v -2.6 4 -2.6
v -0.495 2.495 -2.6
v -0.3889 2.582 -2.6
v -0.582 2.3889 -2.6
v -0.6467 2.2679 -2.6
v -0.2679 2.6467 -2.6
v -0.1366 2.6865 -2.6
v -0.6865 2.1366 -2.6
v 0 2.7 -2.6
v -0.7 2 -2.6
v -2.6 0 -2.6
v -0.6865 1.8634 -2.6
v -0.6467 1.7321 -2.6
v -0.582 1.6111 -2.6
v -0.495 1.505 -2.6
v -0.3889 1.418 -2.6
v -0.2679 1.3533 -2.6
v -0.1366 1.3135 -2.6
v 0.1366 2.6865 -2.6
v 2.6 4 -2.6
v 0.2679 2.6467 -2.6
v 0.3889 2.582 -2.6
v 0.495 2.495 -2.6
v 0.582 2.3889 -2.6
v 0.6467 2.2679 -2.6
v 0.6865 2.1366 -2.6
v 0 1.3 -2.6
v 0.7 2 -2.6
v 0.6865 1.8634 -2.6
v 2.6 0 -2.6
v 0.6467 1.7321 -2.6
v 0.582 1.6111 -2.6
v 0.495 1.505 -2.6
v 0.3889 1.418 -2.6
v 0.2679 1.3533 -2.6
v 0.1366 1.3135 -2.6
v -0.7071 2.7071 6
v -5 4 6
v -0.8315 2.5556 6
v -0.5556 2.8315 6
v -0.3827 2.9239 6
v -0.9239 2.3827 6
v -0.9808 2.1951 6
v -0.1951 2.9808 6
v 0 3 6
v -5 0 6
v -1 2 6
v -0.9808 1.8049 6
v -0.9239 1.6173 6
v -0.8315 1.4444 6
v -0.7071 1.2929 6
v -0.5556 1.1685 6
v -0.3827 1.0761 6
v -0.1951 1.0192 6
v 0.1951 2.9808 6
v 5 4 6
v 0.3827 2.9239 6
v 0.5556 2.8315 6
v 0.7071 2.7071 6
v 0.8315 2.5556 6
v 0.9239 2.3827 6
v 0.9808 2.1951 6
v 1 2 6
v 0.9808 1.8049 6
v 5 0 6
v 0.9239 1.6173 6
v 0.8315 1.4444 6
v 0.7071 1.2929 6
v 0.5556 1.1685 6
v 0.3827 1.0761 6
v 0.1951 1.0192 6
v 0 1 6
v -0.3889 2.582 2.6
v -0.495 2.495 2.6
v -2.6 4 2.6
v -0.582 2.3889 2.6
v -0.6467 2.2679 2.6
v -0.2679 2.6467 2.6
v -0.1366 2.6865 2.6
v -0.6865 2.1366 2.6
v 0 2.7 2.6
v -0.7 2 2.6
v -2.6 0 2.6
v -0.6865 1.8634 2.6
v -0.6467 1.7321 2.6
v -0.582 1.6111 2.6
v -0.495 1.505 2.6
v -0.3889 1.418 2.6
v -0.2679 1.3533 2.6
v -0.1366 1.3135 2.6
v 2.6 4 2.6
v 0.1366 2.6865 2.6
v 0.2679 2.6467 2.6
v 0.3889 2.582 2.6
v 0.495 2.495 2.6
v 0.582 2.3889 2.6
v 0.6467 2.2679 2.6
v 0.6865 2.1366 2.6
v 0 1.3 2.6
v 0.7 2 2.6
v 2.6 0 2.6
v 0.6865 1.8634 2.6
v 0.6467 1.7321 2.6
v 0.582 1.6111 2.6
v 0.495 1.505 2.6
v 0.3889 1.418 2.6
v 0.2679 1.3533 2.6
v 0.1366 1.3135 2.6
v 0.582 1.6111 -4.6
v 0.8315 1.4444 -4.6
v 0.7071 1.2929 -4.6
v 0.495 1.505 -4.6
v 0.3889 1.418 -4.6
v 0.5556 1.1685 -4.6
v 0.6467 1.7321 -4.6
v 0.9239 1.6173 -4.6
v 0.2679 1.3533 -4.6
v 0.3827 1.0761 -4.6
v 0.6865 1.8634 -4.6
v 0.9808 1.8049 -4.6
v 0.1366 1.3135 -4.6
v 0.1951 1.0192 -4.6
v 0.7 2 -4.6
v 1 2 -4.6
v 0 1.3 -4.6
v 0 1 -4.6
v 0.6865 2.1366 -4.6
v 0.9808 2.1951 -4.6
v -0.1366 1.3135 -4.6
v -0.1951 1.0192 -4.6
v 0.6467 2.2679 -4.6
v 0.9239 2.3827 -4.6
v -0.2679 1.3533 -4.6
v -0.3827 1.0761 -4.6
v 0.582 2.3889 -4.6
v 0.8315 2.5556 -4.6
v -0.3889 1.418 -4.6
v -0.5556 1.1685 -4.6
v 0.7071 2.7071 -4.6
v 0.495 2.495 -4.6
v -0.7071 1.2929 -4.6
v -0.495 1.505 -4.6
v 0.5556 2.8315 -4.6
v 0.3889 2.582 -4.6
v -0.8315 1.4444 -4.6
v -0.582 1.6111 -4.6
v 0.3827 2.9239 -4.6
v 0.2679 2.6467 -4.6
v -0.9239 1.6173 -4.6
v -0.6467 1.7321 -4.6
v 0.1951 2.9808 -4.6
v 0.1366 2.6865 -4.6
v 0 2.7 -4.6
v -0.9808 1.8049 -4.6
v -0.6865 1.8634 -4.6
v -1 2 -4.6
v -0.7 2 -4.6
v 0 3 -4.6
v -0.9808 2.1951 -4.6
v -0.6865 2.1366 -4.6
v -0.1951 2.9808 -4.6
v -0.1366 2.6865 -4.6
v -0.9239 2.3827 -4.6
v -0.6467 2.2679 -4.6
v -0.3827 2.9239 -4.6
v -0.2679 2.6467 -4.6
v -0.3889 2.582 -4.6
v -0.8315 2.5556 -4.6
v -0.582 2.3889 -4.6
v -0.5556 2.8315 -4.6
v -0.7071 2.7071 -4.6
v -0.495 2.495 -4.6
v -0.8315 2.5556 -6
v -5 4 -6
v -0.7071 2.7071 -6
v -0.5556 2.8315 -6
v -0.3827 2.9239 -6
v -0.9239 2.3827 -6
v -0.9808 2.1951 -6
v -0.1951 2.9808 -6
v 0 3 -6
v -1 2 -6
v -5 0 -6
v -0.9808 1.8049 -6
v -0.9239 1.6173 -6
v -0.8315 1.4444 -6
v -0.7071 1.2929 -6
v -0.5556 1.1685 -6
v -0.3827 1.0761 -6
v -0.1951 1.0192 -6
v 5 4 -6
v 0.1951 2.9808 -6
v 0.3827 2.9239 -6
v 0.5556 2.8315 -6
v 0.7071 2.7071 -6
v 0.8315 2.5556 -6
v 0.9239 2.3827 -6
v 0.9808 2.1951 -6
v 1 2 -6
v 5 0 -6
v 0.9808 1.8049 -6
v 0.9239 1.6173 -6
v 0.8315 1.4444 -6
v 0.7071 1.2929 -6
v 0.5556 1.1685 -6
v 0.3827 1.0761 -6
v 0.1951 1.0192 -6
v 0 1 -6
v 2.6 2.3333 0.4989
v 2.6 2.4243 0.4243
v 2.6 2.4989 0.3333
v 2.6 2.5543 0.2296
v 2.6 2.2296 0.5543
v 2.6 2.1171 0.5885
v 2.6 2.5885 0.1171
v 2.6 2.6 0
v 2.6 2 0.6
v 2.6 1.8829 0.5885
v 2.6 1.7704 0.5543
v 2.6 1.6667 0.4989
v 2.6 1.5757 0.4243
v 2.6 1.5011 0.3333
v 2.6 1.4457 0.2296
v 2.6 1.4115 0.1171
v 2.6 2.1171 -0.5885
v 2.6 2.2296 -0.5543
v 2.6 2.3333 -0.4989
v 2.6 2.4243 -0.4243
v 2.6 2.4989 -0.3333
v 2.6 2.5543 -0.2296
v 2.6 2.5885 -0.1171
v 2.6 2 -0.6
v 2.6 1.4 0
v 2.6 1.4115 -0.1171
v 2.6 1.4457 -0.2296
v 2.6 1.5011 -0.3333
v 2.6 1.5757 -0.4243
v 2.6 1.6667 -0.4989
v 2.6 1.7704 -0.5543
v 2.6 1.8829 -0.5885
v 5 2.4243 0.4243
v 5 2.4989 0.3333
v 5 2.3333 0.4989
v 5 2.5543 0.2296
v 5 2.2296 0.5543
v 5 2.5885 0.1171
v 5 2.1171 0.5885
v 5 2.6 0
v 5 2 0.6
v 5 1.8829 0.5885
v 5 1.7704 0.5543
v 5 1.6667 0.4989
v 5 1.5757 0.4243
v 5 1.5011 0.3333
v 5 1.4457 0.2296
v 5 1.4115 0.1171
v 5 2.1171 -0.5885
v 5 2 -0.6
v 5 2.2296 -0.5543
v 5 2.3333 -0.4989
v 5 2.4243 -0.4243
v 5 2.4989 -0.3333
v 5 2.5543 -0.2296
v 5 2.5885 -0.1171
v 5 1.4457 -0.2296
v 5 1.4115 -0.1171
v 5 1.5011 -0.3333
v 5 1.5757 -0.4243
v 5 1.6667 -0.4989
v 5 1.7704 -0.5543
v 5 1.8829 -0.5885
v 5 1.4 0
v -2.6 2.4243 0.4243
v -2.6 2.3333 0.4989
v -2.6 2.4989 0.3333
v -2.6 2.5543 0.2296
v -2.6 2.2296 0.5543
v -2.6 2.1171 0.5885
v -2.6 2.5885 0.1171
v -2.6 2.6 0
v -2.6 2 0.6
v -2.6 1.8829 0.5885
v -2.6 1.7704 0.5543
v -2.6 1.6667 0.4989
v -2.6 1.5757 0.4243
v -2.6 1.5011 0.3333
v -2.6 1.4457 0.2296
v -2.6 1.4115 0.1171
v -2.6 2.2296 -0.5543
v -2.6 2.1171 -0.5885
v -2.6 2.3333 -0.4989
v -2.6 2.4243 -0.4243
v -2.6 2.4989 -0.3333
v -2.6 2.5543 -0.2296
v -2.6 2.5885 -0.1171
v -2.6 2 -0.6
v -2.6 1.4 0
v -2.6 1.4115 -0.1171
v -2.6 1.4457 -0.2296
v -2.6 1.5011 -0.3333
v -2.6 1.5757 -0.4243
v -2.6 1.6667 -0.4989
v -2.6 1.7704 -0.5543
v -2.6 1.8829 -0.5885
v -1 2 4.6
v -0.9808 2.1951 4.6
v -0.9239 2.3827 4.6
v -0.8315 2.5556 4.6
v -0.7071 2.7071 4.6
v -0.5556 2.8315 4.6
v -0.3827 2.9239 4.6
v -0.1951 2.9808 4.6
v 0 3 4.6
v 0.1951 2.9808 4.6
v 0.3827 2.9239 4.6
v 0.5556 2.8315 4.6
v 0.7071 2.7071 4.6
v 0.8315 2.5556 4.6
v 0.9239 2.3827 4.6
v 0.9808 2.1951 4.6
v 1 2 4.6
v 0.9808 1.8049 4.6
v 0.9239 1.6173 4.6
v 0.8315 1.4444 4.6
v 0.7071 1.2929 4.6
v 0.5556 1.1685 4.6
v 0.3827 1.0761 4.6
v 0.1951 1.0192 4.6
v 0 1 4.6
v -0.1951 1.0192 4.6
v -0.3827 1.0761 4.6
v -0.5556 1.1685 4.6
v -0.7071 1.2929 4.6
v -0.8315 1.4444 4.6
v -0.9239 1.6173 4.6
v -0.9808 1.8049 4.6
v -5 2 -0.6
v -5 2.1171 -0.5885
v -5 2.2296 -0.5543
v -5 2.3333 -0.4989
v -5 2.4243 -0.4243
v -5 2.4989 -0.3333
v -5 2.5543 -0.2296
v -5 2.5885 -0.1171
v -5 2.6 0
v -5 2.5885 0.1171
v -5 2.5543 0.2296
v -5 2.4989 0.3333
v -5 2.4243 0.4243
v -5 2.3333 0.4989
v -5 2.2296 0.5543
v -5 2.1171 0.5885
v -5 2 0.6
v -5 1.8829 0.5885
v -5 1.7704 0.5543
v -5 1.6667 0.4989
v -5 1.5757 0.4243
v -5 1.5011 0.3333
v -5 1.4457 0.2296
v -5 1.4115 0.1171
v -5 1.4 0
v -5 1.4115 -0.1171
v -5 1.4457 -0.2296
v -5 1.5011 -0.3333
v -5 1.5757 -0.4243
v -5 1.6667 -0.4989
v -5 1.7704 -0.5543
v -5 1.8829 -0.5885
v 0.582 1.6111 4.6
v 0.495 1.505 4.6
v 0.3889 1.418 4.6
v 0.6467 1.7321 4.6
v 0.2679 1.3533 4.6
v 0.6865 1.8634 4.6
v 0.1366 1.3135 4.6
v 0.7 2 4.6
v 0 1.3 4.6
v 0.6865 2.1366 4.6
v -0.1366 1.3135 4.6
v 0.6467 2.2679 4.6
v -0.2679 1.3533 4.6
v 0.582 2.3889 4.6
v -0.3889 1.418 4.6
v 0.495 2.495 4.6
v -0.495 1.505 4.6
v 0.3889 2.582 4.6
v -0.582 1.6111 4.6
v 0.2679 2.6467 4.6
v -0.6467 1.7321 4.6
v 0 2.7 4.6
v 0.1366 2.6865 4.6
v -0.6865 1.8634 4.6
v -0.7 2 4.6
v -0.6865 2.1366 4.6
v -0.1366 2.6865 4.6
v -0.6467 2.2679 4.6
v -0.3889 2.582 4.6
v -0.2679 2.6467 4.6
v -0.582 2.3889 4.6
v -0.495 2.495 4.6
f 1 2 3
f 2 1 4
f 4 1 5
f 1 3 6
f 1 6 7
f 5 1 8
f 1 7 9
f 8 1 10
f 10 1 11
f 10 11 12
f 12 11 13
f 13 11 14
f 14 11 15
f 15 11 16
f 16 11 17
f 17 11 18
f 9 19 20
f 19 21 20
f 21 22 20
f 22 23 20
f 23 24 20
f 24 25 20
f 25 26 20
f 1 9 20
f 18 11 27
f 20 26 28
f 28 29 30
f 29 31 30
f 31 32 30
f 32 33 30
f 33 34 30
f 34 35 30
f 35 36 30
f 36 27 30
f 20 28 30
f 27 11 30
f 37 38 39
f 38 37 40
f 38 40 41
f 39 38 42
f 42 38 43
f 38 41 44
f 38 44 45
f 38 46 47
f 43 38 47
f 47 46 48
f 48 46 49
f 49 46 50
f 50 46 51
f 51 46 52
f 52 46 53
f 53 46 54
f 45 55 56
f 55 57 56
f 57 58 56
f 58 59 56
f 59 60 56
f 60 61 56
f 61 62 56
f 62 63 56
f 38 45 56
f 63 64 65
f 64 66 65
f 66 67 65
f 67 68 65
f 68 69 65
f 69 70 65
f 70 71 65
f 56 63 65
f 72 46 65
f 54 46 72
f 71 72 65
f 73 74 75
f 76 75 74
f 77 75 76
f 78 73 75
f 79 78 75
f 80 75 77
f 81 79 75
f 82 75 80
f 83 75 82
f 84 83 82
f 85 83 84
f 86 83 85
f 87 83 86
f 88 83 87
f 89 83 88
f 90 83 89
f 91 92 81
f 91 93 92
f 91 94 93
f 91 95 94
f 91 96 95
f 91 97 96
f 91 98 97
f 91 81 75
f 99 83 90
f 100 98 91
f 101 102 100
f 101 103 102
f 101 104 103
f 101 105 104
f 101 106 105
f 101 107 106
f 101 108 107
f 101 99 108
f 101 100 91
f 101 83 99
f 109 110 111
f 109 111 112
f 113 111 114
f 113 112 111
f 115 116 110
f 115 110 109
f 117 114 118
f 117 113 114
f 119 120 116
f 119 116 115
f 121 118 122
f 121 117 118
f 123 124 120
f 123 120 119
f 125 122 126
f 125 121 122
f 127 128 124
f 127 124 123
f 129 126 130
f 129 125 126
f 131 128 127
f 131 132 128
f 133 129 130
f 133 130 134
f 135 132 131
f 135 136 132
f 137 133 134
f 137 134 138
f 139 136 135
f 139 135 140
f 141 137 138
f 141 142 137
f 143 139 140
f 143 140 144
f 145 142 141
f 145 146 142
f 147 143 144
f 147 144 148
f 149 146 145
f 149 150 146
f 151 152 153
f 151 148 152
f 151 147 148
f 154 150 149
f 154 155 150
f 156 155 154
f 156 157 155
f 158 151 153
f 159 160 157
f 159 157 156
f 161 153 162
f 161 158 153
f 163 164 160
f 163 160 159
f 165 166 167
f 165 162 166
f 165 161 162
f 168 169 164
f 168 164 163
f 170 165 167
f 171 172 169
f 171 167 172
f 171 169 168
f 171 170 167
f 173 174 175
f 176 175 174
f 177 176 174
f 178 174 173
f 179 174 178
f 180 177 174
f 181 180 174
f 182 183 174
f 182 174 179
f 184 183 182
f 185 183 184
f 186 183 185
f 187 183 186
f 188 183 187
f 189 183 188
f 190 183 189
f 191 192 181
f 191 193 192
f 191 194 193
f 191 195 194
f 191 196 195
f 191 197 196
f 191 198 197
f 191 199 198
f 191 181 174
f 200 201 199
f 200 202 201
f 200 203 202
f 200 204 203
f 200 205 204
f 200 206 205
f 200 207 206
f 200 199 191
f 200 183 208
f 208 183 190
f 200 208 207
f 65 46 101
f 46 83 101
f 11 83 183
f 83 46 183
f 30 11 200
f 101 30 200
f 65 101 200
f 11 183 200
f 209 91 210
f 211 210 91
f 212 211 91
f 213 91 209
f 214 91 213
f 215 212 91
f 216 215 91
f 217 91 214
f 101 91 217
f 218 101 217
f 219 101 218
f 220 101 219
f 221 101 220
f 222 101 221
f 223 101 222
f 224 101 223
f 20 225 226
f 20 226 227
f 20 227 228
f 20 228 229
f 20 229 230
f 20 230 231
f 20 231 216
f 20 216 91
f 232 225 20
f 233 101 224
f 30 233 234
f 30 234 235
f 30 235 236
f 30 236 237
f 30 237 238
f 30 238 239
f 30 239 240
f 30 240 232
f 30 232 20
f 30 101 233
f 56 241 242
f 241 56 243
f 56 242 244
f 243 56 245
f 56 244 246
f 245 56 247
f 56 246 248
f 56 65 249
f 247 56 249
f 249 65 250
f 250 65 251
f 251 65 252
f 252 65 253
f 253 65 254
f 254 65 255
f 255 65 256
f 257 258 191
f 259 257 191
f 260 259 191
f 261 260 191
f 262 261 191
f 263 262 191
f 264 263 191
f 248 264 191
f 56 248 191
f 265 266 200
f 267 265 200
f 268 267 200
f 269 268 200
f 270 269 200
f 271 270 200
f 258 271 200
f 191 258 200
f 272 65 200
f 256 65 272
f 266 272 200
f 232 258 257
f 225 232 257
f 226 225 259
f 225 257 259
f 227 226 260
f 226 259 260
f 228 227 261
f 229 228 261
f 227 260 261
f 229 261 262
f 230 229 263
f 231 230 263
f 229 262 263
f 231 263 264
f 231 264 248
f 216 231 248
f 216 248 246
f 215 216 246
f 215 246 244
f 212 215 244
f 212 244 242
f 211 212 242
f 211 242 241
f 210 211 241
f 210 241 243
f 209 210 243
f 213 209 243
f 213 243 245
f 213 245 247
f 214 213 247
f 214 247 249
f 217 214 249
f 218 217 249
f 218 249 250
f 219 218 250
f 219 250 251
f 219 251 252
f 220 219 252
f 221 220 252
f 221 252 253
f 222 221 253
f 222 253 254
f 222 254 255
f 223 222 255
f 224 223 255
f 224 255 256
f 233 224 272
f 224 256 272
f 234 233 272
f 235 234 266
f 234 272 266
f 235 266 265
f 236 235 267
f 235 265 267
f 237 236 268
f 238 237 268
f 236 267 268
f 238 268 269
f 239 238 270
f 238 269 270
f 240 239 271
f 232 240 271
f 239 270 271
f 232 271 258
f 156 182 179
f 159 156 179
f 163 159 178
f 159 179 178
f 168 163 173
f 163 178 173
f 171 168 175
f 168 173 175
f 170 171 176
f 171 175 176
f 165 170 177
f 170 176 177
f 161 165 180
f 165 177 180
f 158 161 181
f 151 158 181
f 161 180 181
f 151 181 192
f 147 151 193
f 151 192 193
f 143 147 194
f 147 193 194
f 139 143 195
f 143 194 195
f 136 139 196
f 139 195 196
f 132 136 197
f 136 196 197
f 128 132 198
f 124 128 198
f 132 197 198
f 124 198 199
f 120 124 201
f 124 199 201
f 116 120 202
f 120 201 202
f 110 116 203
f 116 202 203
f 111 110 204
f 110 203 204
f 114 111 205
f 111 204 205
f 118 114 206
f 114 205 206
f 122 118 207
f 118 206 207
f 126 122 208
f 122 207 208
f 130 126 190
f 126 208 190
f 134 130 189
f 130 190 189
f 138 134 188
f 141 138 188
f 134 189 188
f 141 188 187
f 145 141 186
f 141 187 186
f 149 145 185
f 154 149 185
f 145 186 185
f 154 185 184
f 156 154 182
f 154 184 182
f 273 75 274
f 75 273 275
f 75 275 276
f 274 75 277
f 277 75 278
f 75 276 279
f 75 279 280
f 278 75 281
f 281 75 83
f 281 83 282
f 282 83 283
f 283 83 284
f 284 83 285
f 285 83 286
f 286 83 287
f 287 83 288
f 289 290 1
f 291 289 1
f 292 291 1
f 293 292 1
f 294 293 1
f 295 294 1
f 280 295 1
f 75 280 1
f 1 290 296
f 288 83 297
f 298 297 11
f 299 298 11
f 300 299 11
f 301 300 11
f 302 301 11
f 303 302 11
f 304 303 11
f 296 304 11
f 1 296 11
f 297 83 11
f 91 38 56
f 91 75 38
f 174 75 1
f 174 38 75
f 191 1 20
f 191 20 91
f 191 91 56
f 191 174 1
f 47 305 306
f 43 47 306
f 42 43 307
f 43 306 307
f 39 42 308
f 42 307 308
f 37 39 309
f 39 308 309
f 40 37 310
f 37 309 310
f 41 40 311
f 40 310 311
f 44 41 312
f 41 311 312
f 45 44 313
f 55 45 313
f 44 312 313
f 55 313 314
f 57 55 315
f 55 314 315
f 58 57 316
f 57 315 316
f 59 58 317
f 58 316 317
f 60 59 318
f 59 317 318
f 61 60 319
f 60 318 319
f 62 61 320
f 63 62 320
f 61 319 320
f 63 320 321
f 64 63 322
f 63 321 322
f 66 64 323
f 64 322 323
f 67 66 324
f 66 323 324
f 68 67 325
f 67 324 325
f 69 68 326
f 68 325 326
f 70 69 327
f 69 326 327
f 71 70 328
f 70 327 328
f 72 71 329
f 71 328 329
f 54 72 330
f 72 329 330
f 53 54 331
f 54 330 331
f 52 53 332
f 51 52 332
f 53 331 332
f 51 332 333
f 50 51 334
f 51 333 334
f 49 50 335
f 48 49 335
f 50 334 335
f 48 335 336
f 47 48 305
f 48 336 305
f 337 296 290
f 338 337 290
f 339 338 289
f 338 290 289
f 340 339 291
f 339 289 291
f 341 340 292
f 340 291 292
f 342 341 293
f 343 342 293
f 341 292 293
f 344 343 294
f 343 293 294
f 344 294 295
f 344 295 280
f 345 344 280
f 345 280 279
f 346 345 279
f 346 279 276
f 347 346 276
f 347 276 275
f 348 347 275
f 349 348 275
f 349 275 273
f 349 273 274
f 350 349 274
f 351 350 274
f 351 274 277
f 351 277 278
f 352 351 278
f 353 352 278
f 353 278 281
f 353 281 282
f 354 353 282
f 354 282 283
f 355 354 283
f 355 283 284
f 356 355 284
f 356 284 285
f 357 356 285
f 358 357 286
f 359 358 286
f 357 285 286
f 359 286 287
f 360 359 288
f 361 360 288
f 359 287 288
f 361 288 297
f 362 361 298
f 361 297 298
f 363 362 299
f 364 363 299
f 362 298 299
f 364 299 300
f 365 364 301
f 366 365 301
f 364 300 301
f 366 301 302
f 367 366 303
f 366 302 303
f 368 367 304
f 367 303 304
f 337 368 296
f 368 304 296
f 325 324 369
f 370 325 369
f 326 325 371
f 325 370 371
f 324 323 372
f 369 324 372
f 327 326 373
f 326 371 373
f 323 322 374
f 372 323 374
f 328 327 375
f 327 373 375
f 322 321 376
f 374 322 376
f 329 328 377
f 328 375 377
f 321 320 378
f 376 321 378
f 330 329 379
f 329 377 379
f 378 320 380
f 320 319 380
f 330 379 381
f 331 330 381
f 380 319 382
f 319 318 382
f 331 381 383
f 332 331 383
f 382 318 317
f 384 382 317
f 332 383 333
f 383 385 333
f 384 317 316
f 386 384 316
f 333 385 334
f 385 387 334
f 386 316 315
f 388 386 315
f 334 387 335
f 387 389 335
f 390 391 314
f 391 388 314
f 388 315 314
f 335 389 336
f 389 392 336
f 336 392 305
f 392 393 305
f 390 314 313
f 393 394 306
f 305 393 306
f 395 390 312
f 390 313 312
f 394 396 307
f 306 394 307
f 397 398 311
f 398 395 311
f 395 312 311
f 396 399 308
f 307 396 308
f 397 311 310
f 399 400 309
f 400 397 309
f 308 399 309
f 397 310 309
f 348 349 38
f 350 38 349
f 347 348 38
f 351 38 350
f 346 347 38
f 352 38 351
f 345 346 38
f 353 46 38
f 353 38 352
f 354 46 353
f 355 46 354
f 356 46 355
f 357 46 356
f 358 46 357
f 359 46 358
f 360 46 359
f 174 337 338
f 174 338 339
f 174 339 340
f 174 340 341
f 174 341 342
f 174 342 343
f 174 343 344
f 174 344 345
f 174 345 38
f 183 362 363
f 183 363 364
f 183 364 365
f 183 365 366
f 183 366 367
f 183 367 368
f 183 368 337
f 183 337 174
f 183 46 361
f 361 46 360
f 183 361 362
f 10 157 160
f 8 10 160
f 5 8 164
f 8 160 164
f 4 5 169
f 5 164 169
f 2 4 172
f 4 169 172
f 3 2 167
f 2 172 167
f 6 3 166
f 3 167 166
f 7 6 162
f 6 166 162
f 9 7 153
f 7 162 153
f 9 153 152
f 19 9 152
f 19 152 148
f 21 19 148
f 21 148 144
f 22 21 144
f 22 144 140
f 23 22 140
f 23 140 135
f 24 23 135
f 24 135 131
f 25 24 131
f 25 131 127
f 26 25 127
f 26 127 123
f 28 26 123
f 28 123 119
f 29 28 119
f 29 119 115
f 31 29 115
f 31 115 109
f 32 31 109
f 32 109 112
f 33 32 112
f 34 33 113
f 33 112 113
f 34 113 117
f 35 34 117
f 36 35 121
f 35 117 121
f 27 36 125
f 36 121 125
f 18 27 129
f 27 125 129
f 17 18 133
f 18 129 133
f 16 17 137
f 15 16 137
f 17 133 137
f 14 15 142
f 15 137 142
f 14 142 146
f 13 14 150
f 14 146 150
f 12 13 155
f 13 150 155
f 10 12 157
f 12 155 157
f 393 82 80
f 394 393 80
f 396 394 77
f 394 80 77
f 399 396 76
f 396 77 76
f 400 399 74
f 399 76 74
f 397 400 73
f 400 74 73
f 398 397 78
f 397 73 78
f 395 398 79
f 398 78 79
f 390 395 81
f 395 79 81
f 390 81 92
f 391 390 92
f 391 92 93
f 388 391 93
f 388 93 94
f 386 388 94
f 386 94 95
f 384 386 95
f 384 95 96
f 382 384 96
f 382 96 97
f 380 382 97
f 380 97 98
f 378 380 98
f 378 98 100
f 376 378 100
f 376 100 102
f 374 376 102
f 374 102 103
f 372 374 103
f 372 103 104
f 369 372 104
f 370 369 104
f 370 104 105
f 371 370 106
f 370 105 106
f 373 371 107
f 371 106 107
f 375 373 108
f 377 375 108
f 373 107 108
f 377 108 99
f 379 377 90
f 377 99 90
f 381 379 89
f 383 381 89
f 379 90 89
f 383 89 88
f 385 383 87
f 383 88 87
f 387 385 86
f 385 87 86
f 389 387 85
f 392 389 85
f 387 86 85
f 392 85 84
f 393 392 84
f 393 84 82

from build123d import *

# Parameters (mm, degrees)
SKETCH_1_W          = 10
SKETCH_1_H          = 12
SKETCH_1_W_2        = 5.2
SKETCH_1_H_2        = 5.2
EXTRUDE_1_DEPTH     = 4
SKETCH_2_R          = 0.6
CUT_EXTRUDE_1_DEPTH = 13.328828006
SKETCH_3_R          = 0.7
CUT_EXTRUDE_2_DEPTH = 14.601470509
SKETCH_3_3_R        = 1
CUT_EXTRUDE_3_DEPTH = 1.4
CUT_EXTRUDE_START   = -10.6
SKETCH_3_4_R        = 1
CUT_EXTRUDE_4_DEPTH = 1.4


with BuildPart() as part:
    # 草图1 → 凸台-拉伸1 (new body)
    with BuildSketch(Plane(origin=(0, 0, 0), x_dir=(1, 0, 0), z_dir=(0, 1, 0))):
        Rectangle(SKETCH_1_W, SKETCH_1_H)
        Rectangle(SKETCH_1_W_2, SKETCH_1_H_2, mode=Mode.SUBTRACT)
    extrude(amount=EXTRUDE_1_DEPTH)

    # 草图2 → 切除-拉伸1 (cut, through all)
    with BuildSketch(Plane(origin=(5, 0, 0), x_dir=(0, 0, -1), z_dir=(1, 0, 0))):
        with Locations((0, 2)):
            Circle(SKETCH_2_R)
    extrude(amount=-CUT_EXTRUDE_1_DEPTH, mode=Mode.SUBTRACT)

    # 草图3 → 切除-拉伸2 (cut, through all)
    with BuildSketch(Plane(origin=(0, 0, -6), x_dir=(-1, 0, 0), z_dir=(0, 0, -1))):
        with Locations((0, 2)):
            Circle(SKETCH_3_R)
    extrude(amount=-CUT_EXTRUDE_2_DEPTH, mode=Mode.SUBTRACT)

    # 草图3<3> → 切除-拉伸3 (cut)
    with BuildSketch(Plane(origin=(0, 0, -6), x_dir=(-1, 0, 0), z_dir=(0, 0, -1))):
        with Locations((0, 2)):
            Circle(SKETCH_3_3_R)
    extrude(amount=-CUT_EXTRUDE_3_DEPTH, mode=Mode.SUBTRACT)

    # 草图3<4> → 切除-拉伸4 (cut)
    with BuildSketch(Plane(origin=(0, 0, -6), x_dir=(-1, 0, 0), z_dir=(0, 0, -1)).offset(CUT_EXTRUDE_START)):
        with Locations((0, 2)):
            Circle(SKETCH_3_4_R)
    extrude(amount=-CUT_EXTRUDE_4_DEPTH, mode=Mode.SUBTRACT)


solid = part.part
